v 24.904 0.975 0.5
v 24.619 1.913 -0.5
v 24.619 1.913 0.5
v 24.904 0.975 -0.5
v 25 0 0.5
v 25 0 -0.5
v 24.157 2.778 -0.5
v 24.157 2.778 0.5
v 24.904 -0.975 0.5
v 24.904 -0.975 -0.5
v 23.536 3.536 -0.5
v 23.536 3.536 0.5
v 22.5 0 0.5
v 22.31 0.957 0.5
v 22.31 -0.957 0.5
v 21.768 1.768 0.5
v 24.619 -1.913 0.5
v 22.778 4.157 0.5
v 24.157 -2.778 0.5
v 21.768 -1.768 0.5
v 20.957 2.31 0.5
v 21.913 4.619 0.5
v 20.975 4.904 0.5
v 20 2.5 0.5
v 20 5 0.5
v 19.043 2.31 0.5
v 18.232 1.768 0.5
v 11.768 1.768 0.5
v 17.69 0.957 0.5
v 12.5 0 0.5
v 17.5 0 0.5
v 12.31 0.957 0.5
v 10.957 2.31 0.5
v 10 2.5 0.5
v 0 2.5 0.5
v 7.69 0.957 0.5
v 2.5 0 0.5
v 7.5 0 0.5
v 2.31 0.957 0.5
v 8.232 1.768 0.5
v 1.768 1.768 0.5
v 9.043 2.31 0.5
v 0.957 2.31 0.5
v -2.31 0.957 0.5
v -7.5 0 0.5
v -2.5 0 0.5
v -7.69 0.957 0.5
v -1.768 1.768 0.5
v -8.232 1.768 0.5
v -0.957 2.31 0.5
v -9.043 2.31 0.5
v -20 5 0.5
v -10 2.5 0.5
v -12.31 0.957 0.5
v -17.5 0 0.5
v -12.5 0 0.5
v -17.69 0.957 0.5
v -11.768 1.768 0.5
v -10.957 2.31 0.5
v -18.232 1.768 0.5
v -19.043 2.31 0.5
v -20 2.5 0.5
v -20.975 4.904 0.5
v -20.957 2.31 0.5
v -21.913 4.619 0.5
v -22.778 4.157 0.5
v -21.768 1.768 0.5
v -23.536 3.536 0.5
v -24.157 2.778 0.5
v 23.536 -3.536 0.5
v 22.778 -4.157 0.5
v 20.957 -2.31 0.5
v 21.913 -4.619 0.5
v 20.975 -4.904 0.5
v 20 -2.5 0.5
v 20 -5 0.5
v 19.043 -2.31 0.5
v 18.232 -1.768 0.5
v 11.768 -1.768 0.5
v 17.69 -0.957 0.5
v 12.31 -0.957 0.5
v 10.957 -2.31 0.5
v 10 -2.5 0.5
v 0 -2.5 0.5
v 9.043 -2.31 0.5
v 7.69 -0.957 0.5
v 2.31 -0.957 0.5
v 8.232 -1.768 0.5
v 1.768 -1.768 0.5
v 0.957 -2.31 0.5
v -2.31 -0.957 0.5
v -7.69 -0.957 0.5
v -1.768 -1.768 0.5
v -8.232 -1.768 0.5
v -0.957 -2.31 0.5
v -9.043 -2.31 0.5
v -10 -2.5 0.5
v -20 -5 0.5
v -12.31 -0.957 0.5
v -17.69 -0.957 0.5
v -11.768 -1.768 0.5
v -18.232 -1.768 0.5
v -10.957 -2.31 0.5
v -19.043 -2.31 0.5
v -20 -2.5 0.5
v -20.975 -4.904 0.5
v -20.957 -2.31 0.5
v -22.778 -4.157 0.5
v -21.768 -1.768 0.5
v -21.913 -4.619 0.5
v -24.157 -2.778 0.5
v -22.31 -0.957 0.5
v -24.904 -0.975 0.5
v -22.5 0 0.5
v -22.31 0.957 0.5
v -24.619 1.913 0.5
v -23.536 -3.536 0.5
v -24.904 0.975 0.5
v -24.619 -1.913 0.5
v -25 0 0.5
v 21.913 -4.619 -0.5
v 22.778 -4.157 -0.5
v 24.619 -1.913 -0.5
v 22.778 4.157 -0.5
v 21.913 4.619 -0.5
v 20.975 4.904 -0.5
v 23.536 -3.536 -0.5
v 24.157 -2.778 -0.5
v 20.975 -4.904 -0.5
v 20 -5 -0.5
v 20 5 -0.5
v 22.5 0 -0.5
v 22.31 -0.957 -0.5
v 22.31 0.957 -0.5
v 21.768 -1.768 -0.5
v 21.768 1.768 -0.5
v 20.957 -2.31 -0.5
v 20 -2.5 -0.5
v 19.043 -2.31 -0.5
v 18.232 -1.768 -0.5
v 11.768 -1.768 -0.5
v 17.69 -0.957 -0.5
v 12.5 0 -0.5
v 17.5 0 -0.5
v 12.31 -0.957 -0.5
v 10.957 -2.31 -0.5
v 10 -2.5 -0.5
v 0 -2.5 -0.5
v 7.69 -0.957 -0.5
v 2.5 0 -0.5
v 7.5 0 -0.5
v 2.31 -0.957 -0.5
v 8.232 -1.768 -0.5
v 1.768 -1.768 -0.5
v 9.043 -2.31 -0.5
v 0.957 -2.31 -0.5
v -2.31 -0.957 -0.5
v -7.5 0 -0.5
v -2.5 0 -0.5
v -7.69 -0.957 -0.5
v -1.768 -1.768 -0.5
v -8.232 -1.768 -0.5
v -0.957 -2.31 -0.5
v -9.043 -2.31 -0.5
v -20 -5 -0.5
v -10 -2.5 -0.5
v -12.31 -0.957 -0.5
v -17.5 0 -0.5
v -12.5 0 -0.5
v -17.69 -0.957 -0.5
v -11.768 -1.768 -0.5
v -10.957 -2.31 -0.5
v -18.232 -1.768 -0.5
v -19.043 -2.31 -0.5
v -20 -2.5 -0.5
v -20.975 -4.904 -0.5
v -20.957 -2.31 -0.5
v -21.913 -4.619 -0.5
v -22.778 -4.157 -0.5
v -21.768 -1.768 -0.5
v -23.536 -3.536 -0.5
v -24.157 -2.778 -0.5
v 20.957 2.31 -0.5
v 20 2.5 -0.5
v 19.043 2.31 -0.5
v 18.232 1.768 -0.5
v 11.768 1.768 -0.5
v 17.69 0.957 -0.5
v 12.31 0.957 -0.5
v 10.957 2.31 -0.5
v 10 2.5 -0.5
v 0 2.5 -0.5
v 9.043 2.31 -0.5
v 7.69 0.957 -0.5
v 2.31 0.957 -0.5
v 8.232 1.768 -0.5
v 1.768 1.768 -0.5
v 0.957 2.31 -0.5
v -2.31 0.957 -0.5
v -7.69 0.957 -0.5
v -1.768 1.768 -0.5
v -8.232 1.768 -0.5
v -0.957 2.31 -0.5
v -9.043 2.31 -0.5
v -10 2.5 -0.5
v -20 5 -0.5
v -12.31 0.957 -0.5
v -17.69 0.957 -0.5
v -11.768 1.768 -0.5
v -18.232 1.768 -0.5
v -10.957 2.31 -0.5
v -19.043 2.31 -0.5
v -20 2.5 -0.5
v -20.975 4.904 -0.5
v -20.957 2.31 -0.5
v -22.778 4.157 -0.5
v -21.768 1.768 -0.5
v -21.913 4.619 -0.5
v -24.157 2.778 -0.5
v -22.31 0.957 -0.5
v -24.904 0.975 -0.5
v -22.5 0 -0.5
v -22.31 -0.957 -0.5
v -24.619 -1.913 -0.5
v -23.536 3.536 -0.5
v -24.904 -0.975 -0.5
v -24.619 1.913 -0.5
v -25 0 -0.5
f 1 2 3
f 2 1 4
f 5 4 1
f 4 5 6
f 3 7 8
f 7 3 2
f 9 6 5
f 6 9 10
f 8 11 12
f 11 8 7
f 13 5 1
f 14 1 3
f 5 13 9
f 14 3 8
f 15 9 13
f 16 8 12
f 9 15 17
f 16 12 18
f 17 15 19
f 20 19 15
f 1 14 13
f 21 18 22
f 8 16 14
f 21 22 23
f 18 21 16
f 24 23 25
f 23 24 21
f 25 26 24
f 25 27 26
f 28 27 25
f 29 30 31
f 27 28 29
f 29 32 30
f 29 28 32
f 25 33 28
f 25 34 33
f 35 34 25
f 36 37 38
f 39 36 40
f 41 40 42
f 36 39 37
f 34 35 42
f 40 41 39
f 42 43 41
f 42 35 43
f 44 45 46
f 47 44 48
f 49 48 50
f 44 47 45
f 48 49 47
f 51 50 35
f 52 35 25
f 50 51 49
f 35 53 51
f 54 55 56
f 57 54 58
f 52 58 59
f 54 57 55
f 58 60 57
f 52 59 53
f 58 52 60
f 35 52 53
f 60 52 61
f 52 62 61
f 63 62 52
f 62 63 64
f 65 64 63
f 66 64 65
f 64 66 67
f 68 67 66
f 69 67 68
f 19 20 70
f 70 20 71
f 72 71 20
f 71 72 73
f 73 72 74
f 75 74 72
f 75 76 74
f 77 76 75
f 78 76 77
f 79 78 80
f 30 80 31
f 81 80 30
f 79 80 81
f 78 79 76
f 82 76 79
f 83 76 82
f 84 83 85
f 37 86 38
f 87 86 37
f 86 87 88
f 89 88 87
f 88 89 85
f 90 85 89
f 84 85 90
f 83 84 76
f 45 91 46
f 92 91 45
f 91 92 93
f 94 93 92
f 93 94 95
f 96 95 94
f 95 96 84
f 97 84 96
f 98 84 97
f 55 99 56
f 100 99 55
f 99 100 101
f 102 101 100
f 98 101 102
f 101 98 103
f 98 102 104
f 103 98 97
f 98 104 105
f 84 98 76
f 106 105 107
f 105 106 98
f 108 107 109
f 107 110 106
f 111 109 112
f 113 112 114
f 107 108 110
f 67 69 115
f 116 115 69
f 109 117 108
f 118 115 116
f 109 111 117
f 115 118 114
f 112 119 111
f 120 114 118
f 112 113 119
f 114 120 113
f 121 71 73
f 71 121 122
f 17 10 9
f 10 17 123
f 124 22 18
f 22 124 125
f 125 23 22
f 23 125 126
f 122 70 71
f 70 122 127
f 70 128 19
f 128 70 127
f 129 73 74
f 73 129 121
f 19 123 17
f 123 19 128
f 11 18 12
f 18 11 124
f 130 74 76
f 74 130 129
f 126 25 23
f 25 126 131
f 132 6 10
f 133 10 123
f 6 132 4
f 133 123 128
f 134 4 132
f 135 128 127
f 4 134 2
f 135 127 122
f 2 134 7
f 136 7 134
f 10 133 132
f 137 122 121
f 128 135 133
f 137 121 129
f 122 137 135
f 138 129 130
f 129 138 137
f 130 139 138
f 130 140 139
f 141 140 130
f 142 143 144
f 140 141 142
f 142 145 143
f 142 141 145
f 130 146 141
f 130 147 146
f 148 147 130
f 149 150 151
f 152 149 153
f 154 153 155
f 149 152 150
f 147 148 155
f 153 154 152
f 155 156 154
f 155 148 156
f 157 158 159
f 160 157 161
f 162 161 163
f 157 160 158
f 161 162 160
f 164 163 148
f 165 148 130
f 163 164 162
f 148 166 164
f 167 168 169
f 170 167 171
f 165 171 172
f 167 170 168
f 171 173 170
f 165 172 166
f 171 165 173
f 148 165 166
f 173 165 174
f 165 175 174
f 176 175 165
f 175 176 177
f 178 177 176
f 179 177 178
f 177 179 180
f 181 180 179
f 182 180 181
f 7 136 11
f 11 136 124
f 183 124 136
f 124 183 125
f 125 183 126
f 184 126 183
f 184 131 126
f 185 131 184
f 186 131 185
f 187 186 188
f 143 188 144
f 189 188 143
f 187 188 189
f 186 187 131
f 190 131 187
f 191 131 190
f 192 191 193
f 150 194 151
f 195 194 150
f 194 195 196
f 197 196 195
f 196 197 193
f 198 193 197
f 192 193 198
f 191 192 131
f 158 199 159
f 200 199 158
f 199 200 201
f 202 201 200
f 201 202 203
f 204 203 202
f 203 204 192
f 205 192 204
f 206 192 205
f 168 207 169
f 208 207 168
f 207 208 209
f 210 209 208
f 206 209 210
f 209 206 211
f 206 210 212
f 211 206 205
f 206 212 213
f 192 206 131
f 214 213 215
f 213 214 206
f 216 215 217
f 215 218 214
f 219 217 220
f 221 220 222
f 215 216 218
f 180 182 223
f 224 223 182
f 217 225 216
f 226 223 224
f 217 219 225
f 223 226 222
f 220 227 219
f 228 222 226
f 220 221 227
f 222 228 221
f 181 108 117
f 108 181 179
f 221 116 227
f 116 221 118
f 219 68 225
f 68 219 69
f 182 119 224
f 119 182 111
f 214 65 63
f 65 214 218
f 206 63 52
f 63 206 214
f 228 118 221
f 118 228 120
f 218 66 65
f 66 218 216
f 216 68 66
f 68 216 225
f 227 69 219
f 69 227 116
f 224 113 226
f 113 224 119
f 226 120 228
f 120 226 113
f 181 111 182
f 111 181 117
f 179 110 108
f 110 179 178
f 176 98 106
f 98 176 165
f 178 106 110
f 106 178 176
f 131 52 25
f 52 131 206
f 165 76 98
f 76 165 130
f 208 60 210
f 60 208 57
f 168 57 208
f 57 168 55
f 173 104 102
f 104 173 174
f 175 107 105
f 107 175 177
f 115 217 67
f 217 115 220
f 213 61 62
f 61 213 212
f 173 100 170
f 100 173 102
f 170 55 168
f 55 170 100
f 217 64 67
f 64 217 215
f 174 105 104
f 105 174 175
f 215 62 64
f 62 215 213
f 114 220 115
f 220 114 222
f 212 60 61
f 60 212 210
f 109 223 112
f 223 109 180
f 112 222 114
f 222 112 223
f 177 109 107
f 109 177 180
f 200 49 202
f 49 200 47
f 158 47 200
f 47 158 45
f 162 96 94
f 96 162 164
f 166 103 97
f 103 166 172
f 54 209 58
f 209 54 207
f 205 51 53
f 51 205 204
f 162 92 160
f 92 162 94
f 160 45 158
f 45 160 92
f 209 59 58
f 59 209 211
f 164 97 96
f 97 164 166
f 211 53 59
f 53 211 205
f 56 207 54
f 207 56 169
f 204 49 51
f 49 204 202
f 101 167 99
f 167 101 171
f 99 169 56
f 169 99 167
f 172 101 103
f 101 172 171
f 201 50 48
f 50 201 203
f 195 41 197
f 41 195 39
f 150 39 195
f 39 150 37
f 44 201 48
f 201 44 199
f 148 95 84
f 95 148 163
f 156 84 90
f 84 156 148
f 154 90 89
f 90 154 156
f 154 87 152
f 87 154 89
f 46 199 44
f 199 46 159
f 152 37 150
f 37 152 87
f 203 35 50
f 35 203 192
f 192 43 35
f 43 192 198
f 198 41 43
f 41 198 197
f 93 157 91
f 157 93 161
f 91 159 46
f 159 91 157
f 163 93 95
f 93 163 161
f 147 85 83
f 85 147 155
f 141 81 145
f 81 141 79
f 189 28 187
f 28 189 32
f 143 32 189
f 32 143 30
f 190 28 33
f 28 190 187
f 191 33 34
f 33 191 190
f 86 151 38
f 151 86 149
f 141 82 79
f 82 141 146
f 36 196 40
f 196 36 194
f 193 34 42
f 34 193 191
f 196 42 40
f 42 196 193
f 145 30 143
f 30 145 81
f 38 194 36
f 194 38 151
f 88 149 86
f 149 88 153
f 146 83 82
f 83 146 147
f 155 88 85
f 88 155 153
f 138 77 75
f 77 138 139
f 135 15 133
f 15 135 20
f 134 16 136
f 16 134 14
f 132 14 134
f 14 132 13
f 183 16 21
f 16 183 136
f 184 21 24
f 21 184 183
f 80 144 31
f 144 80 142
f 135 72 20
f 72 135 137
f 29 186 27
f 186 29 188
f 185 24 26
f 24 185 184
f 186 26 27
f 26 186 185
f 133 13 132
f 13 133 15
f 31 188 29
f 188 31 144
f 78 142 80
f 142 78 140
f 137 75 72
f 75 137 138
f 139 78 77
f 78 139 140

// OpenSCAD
height = 1.0; // mm
width = 10.0; // mm
total_length = 50.0; //mm

hole_diameter = 5.0; // mm
hole_distances_from_center = [-20:10:20]; // mm

$fa = 1.0;
$fs = 1.0;

difference()
{
    union()
    {
        cube([total_length - width, width, height], center=true);
        {
            for (sign = [+1,-1])
            translate([(total_length - total_length/2 - width/2)*sign, 0, 0])
            {
                cylinder(r=width/2, h=height, center=true);
            };
        };
    };
    union()
    {   for (hole_distance_from_center = hole_distances_from_center)
        translate([hole_distance_from_center, 0, 0])
        {
            cylinder(r=hole_diameter/2, h=height + 1.0, center=true);
        };
    }
}
